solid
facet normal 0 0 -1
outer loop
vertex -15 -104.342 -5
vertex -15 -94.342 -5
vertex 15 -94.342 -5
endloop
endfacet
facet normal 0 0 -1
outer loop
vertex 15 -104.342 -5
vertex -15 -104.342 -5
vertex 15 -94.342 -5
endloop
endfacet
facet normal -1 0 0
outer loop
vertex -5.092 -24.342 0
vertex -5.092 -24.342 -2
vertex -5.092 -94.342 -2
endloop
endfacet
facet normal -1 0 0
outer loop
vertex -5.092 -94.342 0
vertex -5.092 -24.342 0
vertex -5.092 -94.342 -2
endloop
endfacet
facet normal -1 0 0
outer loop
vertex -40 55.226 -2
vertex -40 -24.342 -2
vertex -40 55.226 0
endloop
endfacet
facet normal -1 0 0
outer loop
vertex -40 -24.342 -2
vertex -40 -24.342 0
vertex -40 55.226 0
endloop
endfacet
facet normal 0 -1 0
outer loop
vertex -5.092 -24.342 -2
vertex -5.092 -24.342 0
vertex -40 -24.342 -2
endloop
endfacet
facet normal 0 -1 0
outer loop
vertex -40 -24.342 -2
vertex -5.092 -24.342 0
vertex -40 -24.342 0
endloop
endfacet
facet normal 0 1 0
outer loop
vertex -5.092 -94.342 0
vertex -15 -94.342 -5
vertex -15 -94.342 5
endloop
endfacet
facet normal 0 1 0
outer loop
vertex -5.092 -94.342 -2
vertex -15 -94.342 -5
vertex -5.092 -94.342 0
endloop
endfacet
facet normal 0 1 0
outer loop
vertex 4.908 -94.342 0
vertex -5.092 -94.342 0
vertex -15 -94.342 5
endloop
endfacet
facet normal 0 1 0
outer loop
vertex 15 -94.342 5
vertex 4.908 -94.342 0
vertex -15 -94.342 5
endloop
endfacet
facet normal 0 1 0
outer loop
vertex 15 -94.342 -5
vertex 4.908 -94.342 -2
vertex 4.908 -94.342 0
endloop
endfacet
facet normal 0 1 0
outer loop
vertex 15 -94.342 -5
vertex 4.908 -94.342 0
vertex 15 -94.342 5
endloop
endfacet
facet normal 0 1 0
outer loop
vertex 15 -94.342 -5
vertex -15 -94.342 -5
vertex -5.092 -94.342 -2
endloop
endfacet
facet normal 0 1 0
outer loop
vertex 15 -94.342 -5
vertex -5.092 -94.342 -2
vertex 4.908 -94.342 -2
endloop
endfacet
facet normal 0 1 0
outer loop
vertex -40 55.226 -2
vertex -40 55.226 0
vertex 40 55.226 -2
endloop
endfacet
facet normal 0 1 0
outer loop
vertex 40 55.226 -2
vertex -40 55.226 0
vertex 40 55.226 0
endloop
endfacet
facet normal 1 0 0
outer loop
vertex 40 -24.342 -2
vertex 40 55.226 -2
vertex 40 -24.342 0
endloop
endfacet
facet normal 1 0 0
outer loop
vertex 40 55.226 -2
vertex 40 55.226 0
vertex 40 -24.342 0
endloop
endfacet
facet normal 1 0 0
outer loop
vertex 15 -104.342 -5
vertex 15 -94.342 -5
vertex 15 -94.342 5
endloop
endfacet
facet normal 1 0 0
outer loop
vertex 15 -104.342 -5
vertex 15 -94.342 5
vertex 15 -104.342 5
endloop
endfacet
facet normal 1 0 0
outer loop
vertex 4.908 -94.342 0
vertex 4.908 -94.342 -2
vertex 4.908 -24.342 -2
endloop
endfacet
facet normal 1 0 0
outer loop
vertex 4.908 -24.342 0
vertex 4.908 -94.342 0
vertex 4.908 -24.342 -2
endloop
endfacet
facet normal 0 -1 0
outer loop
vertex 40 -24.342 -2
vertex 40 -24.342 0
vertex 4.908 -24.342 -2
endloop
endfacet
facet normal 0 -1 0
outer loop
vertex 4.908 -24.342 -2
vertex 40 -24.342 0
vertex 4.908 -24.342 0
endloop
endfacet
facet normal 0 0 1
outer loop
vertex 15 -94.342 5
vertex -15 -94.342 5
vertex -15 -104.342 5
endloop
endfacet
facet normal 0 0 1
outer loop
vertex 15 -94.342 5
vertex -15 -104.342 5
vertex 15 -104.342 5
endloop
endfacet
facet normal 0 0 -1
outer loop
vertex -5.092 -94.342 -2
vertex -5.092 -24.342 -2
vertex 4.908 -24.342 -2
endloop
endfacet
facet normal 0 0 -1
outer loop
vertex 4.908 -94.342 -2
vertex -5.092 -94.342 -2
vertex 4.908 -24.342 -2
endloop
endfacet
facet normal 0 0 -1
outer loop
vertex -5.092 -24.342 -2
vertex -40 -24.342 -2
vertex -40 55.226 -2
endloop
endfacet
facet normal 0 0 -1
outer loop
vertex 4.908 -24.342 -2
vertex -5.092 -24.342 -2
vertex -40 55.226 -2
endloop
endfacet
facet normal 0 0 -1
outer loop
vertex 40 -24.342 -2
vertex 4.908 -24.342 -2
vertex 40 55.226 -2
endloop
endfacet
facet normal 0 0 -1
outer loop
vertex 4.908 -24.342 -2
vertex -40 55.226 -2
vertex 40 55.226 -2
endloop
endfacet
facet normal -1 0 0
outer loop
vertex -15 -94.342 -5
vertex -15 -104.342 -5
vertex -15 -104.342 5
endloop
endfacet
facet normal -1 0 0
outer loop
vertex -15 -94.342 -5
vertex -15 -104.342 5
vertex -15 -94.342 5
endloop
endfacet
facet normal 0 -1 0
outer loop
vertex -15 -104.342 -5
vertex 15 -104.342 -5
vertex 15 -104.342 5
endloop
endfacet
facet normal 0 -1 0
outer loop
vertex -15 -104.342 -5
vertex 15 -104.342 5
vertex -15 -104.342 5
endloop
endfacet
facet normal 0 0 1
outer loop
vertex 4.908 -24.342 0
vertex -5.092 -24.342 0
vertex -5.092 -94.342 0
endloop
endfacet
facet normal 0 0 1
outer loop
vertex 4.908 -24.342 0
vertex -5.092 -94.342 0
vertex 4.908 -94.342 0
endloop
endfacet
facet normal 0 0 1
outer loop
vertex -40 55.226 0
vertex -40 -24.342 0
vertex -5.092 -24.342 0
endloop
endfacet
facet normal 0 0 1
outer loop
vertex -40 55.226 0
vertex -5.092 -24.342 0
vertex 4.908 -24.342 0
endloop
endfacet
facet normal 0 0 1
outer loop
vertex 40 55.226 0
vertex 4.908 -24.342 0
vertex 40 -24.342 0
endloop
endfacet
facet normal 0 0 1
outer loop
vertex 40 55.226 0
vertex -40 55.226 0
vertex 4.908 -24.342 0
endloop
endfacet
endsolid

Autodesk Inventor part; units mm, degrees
ref_plane "YZ Plane" through (0, 0, 0) normal (1, 0, 0) x (0, 1, 0)
ref_plane "XZ Plane" through (0, 0, 0) normal (0, 1, 0) x (-1, 0, 0)
ref_plane "XY Plane" through (0, 0, 0) normal (0, 0, 1) x (1, 0, 0)
sketch "Sketch1" plane through (0, 0, 0) normal (0, 0, 1) x (1, 0, 0)
  line L0 (-40, 55.2261) -> (40, 55.2261)
  line L1 (40, 55.2261) -> (40, -24.3415)
  line L2 (40, -24.3415) -> (-40, -24.3415)
  line L3 (-40, -24.3415) -> (-40, 55.2261)
  point P0 (0, 0)
  dimension "d8" = 24.3415
extrude "Extrusion1" add sketch "Sketch1" against normal blind 2
sketch "Sketch2" plane through (0, 0, 0) normal (0, 0, 1) x (1, 0, 0)
  line L0 (-40, 55.2261) -> (40, 55.2261) projected
  line L1 (-40, 55.2261) -> (39.9042, 55.2261) construction
  line L2 (39.9042, 55.2261) -> (39.9042, -24.6781) construction
  line L3 (39.9042, -24.6781) -> (-40, -24.6781) construction
  line L4 (-40, -24.6781) -> (-40, 55.2261) construction
  point P0 (0, 0)
sketch "Sketch3" plane through (0, 0, 0) normal (0, 0, 1) x (1, 0, 0)
  line L0 (40, -24.3415) -> (-40, -24.3415) projected
  line L1 (-5, -24.3415) -> (5, -24.3415)
  line L2 (5, -24.3415) -> (5, -94.3415)
  line L3 (5, -94.3415) -> (-5, -94.3415)
  line L4 (-5, -94.3415) -> (-5, -24.3415)
  line L5 (-15, -94.3415) -> (15, -94.3415)
  line L6 (15, -94.3415) -> (15, -104.3415)
  line L7 (15, -104.3415) -> (-15, -104.3415)
  line L8 (-15, -104.3415) -> (-15, -94.3415)
  point P0 (0, 0)
  dimension "d12" = 10
  dimension "d13" = 70
  dimension "d14" = 5
  dimension "d15" = 30
  dimension "d16" = 10
extrude "Extrusion2" add sketch "Sketch3" along normal mid plane 10 contours L5 L6 L7 L8 L3
sketch "Sketch4" plane through (0, 0, 5) normal (0, 0, 1) x (1, 0, 0)
  point P0 (0, 0)
sketch "Sketch7" plane through (0, 0, -2) normal (0, 0, -1) x (-1, 0, 0)
  line L0 (-40, -24.3415) -> (40, -24.3415) projected
  line L1 (-15, -94.3415) -> (15, -94.3415) projected
  line L2 (-4.9075, -24.3415) -> (5.0925, -24.3415)
  line L3 (5.0925, -24.3415) -> (5.0925, -94.3415)
  line L4 (5.0925, -94.3415) -> (-4.9075, -94.3415)
  line L5 (-4.9075, -94.3415) -> (-4.9075, -24.3415)
  point P0 (0, 0)
  dimension "d21" = 10
extrude "Extrusion3" add sketch "Sketch7" against normal blind 2
properties part number "parkinglot"
